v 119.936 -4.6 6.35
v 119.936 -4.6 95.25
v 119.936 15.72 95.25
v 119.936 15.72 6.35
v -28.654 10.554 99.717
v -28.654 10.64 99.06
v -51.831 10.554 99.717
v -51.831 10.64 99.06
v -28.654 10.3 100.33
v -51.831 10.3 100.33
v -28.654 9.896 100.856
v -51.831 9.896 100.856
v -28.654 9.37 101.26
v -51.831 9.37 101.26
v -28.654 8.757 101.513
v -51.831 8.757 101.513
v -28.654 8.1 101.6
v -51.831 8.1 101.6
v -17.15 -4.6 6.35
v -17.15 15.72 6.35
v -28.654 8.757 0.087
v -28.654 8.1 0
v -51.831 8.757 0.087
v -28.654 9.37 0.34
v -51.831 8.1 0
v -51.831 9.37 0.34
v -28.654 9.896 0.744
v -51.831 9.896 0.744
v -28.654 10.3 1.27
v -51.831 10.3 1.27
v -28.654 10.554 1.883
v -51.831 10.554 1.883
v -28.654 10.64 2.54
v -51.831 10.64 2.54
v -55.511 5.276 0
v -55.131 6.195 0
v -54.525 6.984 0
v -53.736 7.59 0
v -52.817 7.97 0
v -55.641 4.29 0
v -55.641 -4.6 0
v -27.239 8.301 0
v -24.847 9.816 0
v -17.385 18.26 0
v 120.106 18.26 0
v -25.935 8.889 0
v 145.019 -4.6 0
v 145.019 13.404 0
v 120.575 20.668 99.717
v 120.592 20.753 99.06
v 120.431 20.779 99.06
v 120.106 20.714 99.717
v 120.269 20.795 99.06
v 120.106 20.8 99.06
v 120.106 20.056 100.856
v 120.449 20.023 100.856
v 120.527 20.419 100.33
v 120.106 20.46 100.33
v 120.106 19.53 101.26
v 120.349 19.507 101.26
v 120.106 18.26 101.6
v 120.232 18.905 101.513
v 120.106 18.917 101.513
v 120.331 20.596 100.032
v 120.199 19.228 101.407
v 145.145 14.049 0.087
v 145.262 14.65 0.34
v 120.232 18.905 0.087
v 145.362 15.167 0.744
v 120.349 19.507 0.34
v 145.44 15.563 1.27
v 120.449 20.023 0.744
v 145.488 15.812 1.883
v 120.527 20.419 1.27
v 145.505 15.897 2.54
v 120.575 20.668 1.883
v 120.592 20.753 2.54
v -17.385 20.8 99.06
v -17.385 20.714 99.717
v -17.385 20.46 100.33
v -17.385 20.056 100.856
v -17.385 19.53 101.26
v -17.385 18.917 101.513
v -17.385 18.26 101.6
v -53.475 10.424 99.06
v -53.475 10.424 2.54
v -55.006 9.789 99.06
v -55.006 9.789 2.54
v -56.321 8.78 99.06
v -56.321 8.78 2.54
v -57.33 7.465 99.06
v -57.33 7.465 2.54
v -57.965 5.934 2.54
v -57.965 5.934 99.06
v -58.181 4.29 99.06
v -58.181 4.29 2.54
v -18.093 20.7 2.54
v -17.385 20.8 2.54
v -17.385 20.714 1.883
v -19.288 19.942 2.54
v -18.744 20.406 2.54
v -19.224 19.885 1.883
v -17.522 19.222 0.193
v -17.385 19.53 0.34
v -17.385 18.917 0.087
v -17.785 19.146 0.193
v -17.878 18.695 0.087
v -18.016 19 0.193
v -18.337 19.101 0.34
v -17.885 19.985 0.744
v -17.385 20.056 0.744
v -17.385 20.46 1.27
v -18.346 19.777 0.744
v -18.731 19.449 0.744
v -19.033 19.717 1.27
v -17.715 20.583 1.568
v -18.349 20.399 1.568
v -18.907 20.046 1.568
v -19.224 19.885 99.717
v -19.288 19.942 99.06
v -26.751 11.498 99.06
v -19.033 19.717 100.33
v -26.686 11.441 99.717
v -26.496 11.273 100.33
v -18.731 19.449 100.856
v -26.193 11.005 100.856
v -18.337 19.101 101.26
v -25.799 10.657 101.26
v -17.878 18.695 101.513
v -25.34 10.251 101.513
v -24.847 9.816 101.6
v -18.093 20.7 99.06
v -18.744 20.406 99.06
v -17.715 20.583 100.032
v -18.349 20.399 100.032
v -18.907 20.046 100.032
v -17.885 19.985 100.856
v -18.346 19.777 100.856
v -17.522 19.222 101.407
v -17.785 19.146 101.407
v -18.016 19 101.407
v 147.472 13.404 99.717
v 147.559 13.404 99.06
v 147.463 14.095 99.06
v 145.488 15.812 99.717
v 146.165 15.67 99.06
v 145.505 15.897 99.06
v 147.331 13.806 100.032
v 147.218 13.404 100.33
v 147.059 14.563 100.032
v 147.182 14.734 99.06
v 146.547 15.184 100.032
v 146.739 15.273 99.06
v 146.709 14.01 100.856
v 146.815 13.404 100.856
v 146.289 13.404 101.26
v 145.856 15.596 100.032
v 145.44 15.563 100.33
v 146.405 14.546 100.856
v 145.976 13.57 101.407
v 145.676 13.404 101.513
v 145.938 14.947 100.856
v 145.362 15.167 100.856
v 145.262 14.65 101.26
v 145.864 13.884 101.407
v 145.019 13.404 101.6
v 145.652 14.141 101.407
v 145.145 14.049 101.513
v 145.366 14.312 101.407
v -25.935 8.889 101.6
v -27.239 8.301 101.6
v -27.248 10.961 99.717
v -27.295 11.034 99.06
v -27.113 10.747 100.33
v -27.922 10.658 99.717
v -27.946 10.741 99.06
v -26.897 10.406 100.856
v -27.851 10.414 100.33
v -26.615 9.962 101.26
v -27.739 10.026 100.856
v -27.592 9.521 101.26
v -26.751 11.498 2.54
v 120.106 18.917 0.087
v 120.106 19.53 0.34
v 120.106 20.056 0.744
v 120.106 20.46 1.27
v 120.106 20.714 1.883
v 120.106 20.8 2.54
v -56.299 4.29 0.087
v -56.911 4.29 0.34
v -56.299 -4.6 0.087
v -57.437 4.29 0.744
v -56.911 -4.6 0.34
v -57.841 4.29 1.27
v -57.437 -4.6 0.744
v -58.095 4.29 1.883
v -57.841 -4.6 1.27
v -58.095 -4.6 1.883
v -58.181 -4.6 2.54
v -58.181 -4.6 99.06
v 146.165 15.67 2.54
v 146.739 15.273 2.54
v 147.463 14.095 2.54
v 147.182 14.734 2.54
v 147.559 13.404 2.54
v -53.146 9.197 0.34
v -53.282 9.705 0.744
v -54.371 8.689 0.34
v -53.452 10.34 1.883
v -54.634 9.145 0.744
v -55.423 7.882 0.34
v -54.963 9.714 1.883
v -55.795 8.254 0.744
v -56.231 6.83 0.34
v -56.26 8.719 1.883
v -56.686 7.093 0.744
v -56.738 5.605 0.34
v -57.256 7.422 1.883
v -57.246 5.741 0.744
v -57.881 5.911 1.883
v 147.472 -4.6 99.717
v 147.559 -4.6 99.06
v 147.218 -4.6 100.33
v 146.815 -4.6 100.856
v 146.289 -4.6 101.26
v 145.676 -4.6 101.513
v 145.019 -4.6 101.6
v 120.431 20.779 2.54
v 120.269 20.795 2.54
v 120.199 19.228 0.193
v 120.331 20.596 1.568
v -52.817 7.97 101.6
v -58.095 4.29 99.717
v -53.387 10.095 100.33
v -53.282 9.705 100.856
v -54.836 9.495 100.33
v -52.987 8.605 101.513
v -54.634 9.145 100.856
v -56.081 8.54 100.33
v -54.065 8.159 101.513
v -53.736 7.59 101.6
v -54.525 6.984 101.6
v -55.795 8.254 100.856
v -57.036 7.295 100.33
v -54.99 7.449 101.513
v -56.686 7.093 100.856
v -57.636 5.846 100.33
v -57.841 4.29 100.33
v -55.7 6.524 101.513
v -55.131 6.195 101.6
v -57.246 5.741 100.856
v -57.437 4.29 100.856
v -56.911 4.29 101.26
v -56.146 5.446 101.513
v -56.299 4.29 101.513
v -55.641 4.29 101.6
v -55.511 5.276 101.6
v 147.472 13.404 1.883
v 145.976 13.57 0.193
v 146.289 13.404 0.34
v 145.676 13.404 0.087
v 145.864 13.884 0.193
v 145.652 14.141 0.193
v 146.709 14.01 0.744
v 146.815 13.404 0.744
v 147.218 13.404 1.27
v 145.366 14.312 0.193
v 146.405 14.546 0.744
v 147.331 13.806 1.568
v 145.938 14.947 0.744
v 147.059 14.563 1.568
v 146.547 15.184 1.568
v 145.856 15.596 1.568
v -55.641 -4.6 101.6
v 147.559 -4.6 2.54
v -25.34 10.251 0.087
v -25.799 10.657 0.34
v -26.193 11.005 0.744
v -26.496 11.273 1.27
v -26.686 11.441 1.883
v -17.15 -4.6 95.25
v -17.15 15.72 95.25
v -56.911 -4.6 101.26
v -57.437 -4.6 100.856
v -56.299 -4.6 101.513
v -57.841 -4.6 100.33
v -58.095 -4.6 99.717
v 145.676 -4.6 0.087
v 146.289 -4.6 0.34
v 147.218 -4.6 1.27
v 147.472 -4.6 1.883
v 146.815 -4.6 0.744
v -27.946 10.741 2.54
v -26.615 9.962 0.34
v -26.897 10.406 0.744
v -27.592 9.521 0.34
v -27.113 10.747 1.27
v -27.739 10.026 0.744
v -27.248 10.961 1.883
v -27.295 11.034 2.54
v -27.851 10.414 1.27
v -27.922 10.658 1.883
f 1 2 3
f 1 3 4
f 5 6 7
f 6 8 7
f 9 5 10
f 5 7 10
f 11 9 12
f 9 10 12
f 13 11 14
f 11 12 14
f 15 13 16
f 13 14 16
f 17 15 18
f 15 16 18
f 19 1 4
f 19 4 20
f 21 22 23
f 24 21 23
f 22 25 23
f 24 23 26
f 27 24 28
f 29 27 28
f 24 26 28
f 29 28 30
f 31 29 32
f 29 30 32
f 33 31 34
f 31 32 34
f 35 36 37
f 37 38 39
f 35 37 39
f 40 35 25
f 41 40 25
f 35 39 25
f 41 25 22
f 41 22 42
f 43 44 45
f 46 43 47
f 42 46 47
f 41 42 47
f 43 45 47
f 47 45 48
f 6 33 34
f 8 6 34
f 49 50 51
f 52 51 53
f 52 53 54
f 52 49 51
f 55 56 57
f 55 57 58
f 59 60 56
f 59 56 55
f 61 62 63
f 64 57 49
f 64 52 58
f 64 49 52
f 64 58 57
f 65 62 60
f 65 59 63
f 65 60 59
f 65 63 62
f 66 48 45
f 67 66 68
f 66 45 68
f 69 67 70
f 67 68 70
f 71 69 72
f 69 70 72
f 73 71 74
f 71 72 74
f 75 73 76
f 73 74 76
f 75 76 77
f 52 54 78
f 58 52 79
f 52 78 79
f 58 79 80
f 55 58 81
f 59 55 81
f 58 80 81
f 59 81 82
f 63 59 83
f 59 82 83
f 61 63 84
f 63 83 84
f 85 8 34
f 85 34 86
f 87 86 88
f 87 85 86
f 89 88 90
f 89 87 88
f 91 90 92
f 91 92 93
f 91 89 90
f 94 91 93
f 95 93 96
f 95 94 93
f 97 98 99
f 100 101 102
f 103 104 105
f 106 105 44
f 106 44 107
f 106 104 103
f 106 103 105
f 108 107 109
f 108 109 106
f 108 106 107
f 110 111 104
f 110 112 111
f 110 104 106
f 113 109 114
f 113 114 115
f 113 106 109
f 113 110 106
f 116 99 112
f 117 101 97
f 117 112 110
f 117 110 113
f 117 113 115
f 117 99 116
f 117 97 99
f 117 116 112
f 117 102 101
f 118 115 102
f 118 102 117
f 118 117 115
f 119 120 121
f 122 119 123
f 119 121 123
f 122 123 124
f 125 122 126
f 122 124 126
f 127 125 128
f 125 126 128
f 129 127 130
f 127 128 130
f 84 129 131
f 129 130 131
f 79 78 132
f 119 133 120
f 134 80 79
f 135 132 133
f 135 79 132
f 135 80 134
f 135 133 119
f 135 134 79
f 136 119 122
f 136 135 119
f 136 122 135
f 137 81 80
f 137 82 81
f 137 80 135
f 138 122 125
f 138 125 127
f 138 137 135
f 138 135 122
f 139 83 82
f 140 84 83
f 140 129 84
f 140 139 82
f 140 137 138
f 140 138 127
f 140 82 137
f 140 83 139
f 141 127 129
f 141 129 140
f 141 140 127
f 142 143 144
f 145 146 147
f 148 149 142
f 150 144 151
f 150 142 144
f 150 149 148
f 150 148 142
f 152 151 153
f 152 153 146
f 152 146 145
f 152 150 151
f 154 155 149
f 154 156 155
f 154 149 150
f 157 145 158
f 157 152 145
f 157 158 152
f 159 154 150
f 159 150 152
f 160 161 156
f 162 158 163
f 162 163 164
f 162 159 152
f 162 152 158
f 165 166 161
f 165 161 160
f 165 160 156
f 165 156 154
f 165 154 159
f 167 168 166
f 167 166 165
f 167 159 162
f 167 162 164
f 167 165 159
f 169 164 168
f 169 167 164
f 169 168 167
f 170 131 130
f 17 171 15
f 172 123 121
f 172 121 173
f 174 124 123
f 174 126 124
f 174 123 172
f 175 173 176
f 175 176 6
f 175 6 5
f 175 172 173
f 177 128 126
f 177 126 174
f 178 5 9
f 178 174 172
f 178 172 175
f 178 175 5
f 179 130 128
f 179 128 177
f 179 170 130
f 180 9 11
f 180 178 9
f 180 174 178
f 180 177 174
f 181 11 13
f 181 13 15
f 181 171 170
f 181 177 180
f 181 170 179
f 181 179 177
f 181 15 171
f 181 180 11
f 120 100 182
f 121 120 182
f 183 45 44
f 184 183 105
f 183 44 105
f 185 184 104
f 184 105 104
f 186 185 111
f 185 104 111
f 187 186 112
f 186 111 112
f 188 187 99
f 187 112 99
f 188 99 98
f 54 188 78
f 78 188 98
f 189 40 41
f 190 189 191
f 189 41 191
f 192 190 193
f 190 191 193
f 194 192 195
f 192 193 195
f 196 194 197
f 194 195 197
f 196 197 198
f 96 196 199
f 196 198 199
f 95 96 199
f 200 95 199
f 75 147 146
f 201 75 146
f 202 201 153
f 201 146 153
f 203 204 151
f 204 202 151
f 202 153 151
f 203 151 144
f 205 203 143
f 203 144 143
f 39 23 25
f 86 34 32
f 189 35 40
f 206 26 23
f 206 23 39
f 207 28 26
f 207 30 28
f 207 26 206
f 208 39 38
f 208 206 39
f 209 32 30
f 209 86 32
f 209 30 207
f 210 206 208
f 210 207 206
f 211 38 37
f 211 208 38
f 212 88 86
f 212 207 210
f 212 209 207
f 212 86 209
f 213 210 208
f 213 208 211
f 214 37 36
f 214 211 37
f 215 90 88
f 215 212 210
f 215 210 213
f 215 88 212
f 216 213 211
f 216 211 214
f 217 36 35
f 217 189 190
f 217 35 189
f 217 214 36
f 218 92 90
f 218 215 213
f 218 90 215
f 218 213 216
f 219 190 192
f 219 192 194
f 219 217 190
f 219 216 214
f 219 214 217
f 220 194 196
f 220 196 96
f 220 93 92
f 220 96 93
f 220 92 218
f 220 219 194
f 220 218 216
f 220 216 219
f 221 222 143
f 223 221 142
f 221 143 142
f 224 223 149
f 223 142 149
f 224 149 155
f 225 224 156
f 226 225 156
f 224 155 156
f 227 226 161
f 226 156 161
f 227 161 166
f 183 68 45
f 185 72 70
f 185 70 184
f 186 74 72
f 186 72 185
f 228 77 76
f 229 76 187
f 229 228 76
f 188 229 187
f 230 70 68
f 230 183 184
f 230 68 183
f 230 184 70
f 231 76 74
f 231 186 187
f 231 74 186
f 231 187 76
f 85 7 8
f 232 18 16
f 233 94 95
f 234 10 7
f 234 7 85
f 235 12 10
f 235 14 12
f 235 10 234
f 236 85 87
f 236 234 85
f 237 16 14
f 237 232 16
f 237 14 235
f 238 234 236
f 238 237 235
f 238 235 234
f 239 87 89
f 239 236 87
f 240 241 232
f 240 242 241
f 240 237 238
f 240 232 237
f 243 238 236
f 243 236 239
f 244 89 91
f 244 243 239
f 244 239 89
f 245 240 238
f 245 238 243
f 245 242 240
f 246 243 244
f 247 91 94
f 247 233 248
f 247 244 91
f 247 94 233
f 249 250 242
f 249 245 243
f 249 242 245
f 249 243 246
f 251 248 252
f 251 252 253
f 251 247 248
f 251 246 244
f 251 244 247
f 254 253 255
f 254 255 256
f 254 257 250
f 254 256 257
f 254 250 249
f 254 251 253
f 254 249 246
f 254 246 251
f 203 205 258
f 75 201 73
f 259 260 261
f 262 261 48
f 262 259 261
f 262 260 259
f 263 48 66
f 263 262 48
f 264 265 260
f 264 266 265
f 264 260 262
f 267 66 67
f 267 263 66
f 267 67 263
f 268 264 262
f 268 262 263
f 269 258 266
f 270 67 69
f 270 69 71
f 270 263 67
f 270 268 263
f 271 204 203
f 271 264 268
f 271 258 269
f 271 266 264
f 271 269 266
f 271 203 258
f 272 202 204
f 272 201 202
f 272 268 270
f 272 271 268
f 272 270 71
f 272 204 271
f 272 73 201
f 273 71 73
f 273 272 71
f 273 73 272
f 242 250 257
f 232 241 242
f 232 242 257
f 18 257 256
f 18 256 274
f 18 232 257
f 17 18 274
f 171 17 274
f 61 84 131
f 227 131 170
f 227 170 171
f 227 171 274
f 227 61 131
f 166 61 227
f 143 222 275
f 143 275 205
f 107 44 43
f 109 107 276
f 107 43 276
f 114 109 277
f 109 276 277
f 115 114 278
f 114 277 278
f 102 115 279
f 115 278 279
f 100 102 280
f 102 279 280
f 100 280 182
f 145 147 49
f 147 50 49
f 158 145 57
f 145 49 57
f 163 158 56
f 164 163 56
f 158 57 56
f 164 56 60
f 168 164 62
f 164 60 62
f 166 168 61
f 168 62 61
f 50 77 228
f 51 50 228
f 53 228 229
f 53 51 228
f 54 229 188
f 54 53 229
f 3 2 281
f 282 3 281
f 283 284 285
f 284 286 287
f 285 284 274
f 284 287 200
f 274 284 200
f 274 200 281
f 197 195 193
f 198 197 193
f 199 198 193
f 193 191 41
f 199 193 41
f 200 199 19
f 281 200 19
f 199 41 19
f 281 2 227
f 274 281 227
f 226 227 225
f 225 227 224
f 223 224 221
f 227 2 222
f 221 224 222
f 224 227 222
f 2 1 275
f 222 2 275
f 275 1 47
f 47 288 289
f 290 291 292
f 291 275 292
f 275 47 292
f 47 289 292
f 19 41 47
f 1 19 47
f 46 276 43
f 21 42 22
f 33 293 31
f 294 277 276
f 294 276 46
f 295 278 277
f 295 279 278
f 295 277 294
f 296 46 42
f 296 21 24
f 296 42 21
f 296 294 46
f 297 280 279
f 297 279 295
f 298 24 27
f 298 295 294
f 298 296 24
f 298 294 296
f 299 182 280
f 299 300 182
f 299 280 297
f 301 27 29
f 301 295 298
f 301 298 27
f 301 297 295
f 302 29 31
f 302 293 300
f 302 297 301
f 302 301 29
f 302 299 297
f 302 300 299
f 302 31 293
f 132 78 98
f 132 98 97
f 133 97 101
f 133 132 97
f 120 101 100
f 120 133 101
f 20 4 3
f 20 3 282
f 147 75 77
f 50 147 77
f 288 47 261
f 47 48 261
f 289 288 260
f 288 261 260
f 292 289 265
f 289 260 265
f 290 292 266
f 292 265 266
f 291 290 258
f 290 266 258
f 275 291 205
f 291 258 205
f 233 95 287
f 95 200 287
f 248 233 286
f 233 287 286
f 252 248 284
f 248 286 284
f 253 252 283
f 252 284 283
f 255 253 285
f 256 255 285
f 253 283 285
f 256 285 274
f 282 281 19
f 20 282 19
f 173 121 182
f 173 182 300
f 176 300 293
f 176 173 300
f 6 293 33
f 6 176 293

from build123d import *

# Parameters (mm, degrees)
EXTRUDE_THIN1_DEPTH = 101.6
FILLET1_R           = 6.35
FILLET2_R           = 2.54
FILLET3_R           = 2.54
FILLET4_R           = 2.54
FILLET5_R           = 2.54
SKETCH4_W           = 137.085663299
SKETCH4_H           = 88.9
CUT_EXTRUDE1_DEPTH  = 20.32


# Read off the part's stored shape, not the designer's step: Extrude-Thin1
with BuildPart() as part:
    # Extrude-Thin1 outline → Extrude-Thin1 (new body)
    with BuildSketch(Plane.XY):
        Polygon((147.558789547, -4.59991125), (147.558789547, 15.496429633), (120.350988963, 20.80008875), (-18.530121413, 20.80008875), (-27.508924365, 10.64008875), (-58.181210453, 10.64008875), (-58.181210453, -4.59991125), align=None)
    extrude(amount=EXTRUDE_THIN1_DEPTH)

    # Fillet1
    fillet1_edges = [part.edges().sort_by_distance(p)[0] for p in [
        (-58.181210453, 10.64008875, 50.8),
    ]]
    fillet(fillet1_edges, radius=FILLET1_R)

    # Fillet2
    fillet2_edges = [part.edges().sort_by_distance(p)[0] for p in [
        (147.558789547, 15.496429633, 50.8),
    ]]
    fillet(fillet2_edges, radius=FILLET2_R)

    # Fillet3
    fillet3_edges = [part.edges().sort_by_distance(p)[0] for p in [
        (120.350988963, 20.80008875, 50.8),
        (-18.530121413, 20.80008875, 50.8),
    ]]
    fillet(fillet3_edges, radius=FILLET3_R)

    # Fillet4
    fillet4_edges = [part.edges().sort_by_distance(p)[0] for p in [
        (-27.508924365, 10.64008875, 50.8),
    ]]
    fillet(fillet4_edges, radius=FILLET4_R)

    # Fillet5
    fillet5_edges = [part.edges().sort_by_distance(p)[0] for p in [
        (-58.181210453, -0.15491125, 0),
        (-58.181210453, -0.15491125, 101.6),
        (-40.24258292, 10.64008875, 0),
        (-56.321338514, 8.780216811, 0),
        (-40.24258292, 10.64008875, 101.6),
        (-56.321338514, 8.780216811, 101.6),
        (147.558789547, 4.401918308, 0),
        (146.979144977, 15.018866002, 0),
        (147.558789547, 4.401918308, 101.6),
        (146.979144977, 15.018866002, 101.6),
        (133.048240824, 18.324993588, 0),
        (51.360321792, 20.80008875, 0),
        (120.349853607, 20.788330353, 0),
        (-18.428956215, 20.575675963, 0),
        (51.360321792, 20.80008875, 101.6),
        (133.048240824, 18.324993588, 101.6),
        (120.349853607, 20.788330353, 101.6),
        (-18.428956215, 20.575675963, 101.6),
        (-23.019522889, 15.72008875, 101.6),
        (-23.019522889, 15.72008875, 0),
        (-27.610089563, 10.864501537, 0),
        (-27.610089563, 10.864501537, 101.6),
    ]]
    fillet(fillet5_edges, radius=FILLET5_R)

    # Sketch4 → Cut-Extrude1 (cut)
    with BuildSketch(Plane(origin=(0, -4.59991125, 0), x_dir=(-1, 0, 0), z_dir=(0, -1, 0))):
        with Locations((-51.392828597, -50.8)):
            Rectangle(SKETCH4_W, SKETCH4_H)
    extrude(amount=-CUT_EXTRUDE1_DEPTH, mode=Mode.SUBTRACT)


solid = part.part
